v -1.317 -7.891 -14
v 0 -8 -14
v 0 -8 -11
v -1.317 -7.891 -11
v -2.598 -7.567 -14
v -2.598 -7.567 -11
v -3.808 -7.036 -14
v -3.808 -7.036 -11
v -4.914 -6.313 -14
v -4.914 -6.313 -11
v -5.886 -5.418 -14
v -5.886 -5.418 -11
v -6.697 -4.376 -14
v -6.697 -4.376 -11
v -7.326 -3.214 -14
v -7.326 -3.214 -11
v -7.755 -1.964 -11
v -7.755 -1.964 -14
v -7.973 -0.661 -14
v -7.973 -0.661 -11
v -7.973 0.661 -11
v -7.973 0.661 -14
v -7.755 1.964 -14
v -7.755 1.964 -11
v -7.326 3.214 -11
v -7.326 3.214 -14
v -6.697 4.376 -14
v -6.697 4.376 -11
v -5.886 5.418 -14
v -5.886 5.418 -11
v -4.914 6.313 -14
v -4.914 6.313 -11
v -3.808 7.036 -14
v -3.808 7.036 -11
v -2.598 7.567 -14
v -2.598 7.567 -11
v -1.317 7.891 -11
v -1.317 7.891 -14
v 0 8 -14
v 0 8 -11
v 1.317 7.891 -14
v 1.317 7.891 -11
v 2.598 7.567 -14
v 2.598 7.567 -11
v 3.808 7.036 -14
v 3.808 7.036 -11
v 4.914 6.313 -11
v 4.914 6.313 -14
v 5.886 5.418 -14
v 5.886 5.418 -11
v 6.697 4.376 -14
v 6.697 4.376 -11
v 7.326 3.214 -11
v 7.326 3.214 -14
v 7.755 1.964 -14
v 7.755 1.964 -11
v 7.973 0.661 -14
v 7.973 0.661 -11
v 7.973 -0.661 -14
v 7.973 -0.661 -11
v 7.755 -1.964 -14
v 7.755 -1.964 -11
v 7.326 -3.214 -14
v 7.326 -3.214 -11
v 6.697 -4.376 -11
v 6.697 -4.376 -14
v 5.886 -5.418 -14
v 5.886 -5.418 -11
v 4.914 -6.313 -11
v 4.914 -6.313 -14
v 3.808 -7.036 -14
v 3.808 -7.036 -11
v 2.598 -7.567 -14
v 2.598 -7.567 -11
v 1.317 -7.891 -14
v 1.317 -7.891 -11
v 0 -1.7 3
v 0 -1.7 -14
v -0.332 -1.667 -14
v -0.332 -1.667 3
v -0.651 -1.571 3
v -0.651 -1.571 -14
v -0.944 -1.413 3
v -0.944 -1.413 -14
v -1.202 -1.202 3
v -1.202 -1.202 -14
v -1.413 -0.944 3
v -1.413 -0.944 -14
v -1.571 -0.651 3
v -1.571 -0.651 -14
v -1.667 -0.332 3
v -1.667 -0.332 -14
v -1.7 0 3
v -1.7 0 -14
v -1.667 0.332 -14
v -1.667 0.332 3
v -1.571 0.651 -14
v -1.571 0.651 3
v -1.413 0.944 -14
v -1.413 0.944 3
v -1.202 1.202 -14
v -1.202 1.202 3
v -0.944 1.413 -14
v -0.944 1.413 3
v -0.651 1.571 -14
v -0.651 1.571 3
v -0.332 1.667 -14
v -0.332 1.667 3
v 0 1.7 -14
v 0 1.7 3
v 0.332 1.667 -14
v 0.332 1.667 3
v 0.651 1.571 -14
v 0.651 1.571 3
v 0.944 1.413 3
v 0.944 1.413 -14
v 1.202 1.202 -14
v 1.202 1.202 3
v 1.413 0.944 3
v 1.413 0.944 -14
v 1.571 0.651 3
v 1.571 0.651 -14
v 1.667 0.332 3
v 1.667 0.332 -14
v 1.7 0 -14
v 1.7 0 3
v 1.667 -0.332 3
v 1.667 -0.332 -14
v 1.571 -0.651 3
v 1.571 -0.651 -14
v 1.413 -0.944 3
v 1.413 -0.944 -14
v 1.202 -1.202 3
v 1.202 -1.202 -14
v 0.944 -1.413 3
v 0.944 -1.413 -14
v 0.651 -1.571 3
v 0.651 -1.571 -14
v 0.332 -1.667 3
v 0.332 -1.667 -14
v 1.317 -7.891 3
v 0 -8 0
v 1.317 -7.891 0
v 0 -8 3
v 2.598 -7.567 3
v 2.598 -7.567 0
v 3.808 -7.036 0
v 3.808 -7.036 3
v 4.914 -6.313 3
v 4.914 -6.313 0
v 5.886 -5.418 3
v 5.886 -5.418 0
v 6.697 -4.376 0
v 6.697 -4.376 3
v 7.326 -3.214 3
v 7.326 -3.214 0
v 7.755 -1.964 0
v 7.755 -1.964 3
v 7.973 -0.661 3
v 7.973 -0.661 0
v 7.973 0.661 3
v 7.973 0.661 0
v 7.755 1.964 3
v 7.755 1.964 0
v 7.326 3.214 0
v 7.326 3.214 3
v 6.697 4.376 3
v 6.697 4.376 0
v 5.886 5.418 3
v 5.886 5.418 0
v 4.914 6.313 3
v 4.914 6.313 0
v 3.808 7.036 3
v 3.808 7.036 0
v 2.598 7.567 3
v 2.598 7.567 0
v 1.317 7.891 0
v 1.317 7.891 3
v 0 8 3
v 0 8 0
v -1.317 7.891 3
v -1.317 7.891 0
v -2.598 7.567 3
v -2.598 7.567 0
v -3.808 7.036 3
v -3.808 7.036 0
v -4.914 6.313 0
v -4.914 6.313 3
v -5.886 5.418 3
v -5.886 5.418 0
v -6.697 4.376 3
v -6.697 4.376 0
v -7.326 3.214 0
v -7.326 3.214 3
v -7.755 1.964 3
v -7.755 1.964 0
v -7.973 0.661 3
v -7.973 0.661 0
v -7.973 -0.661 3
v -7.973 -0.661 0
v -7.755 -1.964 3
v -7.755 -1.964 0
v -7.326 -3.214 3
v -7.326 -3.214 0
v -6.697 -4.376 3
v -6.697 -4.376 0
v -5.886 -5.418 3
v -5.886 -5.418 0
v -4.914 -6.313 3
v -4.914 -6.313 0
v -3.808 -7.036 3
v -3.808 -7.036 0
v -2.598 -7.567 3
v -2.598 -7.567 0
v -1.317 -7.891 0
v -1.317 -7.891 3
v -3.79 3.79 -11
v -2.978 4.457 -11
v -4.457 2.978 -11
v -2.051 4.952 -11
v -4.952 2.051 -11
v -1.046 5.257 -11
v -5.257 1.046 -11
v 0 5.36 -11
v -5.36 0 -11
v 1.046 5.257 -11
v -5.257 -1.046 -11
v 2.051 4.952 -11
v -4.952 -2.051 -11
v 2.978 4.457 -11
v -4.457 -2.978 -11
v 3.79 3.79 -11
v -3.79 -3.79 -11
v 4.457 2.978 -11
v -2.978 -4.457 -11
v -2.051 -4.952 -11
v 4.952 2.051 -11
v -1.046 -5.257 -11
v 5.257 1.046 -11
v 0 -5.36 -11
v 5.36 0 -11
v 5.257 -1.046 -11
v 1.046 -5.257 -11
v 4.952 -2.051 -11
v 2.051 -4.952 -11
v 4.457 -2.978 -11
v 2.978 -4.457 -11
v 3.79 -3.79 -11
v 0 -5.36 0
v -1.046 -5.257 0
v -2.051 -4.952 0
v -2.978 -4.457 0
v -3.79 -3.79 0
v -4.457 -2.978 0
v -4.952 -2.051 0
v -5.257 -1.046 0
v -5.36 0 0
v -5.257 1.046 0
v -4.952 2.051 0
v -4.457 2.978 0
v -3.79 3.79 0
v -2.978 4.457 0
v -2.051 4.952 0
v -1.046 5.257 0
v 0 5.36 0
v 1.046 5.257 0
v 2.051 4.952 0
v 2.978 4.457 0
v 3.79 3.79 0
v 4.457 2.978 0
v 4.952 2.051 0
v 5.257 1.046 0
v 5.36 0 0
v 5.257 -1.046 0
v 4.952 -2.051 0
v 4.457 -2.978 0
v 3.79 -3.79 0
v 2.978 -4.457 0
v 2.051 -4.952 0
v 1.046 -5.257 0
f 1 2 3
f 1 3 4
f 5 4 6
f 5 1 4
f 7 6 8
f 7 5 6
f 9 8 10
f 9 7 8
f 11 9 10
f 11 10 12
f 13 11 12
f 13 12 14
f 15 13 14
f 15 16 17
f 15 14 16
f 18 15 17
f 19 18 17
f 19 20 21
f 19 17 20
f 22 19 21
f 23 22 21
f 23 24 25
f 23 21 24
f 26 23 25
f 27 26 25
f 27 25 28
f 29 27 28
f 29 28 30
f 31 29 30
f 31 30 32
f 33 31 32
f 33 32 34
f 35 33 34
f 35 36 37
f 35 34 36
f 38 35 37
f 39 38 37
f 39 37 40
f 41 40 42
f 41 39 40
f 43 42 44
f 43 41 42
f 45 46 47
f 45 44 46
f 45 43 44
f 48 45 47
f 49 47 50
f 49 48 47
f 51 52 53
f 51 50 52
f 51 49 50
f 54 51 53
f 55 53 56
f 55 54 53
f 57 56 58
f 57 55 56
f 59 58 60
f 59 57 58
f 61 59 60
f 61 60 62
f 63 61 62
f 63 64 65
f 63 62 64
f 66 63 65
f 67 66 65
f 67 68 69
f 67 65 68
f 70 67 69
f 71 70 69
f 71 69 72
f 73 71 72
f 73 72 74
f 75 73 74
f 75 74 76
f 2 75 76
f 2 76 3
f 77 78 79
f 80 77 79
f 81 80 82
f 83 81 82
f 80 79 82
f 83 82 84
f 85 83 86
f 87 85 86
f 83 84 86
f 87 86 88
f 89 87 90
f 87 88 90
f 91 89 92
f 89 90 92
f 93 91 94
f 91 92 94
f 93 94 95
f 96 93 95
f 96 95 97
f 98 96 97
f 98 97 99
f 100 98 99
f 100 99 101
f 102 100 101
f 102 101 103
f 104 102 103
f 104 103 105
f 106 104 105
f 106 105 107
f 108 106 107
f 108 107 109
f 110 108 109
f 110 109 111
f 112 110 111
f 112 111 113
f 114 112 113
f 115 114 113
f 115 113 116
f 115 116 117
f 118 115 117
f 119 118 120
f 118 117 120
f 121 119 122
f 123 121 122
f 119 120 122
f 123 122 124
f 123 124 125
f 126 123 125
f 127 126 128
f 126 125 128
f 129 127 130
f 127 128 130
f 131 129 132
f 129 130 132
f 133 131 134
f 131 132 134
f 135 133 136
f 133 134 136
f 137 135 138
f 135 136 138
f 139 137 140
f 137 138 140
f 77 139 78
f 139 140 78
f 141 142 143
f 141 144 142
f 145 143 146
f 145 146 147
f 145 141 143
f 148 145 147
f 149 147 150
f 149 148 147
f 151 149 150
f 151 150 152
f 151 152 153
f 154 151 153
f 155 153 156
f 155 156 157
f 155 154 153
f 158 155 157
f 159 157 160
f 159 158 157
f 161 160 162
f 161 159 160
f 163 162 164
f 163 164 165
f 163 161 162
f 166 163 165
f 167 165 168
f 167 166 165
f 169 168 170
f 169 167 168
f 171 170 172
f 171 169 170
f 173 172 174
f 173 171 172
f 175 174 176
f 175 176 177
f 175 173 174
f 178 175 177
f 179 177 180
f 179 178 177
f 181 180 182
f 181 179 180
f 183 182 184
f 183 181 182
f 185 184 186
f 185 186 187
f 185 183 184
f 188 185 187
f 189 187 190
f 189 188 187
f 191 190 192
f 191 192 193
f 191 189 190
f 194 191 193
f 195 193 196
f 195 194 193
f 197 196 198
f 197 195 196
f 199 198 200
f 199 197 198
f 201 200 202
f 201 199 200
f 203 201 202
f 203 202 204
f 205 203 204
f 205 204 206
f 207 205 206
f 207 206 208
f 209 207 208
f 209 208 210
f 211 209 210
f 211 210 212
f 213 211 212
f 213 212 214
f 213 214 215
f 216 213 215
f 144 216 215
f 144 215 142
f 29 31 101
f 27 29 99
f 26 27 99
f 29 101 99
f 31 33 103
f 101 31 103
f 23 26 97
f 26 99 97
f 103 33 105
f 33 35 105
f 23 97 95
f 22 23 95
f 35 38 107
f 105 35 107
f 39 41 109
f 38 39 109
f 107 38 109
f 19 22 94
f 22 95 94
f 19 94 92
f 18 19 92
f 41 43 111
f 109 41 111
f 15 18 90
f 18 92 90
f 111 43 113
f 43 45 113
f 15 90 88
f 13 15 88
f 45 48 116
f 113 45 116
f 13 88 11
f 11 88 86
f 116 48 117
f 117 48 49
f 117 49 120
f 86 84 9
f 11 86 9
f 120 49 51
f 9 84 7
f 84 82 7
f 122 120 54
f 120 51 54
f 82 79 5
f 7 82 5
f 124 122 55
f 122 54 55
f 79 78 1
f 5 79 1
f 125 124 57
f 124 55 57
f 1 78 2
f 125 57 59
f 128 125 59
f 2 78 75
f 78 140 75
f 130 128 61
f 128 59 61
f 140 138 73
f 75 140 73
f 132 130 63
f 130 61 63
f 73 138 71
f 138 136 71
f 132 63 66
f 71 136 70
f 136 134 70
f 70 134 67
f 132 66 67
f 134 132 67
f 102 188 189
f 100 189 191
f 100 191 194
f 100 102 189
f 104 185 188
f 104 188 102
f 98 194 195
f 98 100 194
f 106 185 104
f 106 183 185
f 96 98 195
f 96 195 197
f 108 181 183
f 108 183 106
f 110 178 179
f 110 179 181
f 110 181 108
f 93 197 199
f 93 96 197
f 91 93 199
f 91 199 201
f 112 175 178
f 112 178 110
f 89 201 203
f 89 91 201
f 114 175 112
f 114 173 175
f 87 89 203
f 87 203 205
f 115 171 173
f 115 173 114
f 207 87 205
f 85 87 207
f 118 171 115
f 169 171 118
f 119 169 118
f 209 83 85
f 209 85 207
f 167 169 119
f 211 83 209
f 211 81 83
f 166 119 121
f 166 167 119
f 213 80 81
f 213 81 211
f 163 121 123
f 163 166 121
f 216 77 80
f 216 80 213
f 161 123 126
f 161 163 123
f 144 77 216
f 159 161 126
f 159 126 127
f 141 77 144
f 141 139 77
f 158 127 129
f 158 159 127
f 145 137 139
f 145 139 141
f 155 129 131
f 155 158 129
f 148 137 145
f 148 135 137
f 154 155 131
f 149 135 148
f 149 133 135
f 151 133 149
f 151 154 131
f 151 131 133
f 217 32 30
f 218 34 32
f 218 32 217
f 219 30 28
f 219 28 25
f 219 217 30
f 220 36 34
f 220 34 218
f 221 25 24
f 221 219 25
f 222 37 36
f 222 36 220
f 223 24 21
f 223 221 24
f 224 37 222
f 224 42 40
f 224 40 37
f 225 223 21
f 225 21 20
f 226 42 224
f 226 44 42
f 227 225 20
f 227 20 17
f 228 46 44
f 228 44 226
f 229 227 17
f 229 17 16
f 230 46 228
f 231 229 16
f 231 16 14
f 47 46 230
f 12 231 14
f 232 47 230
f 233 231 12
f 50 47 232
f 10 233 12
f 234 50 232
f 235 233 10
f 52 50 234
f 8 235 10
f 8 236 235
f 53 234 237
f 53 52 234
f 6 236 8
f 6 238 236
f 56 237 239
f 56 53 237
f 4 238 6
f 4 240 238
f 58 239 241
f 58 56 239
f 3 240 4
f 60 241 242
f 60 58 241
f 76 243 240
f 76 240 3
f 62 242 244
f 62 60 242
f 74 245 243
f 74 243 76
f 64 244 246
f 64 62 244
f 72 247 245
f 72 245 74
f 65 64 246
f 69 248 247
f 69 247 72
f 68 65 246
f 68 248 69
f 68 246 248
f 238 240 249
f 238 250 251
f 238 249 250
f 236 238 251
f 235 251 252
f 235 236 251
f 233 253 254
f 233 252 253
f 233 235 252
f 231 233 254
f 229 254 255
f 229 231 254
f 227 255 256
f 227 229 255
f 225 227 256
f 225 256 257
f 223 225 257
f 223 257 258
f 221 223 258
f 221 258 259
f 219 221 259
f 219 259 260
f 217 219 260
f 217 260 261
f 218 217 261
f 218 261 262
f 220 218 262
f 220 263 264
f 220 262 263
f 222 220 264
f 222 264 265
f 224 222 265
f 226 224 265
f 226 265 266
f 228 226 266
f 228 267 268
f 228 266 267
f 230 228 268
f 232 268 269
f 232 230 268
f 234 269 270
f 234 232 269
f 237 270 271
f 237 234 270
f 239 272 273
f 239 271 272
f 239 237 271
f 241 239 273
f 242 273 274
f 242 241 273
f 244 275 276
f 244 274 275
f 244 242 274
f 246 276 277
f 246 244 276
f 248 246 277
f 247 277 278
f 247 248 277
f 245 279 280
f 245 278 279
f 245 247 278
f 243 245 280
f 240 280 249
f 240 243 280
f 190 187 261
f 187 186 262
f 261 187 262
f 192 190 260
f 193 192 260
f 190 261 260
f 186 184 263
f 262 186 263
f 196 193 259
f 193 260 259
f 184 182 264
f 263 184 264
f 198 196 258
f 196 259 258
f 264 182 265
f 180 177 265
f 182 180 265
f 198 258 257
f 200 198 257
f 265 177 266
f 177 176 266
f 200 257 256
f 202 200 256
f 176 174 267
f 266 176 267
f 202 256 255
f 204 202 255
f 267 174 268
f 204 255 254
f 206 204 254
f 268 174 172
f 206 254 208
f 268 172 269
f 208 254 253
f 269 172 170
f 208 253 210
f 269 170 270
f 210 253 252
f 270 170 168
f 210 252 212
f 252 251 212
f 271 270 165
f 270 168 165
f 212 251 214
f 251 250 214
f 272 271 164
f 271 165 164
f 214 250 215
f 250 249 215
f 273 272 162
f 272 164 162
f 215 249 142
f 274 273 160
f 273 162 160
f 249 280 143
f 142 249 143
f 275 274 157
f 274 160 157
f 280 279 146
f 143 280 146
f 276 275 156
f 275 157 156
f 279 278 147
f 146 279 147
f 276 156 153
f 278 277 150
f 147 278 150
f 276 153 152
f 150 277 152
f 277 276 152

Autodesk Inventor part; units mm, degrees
ref_plane "YZ Plane" through (0, 0, 0) normal (1, 0, 0) x (0, 1, 0)
ref_plane "XZ Plane" through (0, 0, 0) normal (0, 1, 0) x (-1, 0, 0)
sketch "Sketch1" plane through (0, 0, 0) normal (1, 0, 0) x (0, 1, 0)
  line L0 (0, 0) -> (-5.36, 0)
  line L1 (-5.36, 0) -> (-5.36, -11)
  line L2 (-5.36, -11) -> (0, -11)
  line L3 (0, -11) -> (0, 0)
  line L4 (0, -11) -> (-8, -11)
  line L5 (-8, -11) -> (-8, -14)
  line L6 (-8, -14) -> (0, -14)
  line L7 (0, -14) -> (0, -11)
  line L8 (0, 0) -> (-8, 0)
  line L9 (-8, 0) -> (-8, 3)
  line L10 (-8, 3) -> (0, 3)
  line L11 (0, 3) -> (0, 0)
  dimension "d0" = 5.36
  dimension "d1" = 11
  dimension "d10" = 8
  dimension "d11" = 3
  dimension "d12" = 8
  dimension "d13" = 3
revolve "Revolution1" add sketch "Sketch1" angle 360 about axis through (0, 0, -11) along (0, 0, 1)
sketch "Sketch3" plane through (0, 0, 3) normal (0, 0, 1) x (1, 0, 0)
  point P0 (0, 0)
  point P1 (0, 0)
hole "Hole2" at (0, 0, 3) direction (0, 0, -1) diameter 3.4 end through all clearance for "Hex Head Cap Screw DIN EN 24017" size "M3" standard "DIN"
ref_plane "Work Plane1" through (0, 0, -5.5) normal (0, 0, 1) x (1, 0, 0)
properties part number "PuleyIdlerHolder" material "ABS Plastic"
